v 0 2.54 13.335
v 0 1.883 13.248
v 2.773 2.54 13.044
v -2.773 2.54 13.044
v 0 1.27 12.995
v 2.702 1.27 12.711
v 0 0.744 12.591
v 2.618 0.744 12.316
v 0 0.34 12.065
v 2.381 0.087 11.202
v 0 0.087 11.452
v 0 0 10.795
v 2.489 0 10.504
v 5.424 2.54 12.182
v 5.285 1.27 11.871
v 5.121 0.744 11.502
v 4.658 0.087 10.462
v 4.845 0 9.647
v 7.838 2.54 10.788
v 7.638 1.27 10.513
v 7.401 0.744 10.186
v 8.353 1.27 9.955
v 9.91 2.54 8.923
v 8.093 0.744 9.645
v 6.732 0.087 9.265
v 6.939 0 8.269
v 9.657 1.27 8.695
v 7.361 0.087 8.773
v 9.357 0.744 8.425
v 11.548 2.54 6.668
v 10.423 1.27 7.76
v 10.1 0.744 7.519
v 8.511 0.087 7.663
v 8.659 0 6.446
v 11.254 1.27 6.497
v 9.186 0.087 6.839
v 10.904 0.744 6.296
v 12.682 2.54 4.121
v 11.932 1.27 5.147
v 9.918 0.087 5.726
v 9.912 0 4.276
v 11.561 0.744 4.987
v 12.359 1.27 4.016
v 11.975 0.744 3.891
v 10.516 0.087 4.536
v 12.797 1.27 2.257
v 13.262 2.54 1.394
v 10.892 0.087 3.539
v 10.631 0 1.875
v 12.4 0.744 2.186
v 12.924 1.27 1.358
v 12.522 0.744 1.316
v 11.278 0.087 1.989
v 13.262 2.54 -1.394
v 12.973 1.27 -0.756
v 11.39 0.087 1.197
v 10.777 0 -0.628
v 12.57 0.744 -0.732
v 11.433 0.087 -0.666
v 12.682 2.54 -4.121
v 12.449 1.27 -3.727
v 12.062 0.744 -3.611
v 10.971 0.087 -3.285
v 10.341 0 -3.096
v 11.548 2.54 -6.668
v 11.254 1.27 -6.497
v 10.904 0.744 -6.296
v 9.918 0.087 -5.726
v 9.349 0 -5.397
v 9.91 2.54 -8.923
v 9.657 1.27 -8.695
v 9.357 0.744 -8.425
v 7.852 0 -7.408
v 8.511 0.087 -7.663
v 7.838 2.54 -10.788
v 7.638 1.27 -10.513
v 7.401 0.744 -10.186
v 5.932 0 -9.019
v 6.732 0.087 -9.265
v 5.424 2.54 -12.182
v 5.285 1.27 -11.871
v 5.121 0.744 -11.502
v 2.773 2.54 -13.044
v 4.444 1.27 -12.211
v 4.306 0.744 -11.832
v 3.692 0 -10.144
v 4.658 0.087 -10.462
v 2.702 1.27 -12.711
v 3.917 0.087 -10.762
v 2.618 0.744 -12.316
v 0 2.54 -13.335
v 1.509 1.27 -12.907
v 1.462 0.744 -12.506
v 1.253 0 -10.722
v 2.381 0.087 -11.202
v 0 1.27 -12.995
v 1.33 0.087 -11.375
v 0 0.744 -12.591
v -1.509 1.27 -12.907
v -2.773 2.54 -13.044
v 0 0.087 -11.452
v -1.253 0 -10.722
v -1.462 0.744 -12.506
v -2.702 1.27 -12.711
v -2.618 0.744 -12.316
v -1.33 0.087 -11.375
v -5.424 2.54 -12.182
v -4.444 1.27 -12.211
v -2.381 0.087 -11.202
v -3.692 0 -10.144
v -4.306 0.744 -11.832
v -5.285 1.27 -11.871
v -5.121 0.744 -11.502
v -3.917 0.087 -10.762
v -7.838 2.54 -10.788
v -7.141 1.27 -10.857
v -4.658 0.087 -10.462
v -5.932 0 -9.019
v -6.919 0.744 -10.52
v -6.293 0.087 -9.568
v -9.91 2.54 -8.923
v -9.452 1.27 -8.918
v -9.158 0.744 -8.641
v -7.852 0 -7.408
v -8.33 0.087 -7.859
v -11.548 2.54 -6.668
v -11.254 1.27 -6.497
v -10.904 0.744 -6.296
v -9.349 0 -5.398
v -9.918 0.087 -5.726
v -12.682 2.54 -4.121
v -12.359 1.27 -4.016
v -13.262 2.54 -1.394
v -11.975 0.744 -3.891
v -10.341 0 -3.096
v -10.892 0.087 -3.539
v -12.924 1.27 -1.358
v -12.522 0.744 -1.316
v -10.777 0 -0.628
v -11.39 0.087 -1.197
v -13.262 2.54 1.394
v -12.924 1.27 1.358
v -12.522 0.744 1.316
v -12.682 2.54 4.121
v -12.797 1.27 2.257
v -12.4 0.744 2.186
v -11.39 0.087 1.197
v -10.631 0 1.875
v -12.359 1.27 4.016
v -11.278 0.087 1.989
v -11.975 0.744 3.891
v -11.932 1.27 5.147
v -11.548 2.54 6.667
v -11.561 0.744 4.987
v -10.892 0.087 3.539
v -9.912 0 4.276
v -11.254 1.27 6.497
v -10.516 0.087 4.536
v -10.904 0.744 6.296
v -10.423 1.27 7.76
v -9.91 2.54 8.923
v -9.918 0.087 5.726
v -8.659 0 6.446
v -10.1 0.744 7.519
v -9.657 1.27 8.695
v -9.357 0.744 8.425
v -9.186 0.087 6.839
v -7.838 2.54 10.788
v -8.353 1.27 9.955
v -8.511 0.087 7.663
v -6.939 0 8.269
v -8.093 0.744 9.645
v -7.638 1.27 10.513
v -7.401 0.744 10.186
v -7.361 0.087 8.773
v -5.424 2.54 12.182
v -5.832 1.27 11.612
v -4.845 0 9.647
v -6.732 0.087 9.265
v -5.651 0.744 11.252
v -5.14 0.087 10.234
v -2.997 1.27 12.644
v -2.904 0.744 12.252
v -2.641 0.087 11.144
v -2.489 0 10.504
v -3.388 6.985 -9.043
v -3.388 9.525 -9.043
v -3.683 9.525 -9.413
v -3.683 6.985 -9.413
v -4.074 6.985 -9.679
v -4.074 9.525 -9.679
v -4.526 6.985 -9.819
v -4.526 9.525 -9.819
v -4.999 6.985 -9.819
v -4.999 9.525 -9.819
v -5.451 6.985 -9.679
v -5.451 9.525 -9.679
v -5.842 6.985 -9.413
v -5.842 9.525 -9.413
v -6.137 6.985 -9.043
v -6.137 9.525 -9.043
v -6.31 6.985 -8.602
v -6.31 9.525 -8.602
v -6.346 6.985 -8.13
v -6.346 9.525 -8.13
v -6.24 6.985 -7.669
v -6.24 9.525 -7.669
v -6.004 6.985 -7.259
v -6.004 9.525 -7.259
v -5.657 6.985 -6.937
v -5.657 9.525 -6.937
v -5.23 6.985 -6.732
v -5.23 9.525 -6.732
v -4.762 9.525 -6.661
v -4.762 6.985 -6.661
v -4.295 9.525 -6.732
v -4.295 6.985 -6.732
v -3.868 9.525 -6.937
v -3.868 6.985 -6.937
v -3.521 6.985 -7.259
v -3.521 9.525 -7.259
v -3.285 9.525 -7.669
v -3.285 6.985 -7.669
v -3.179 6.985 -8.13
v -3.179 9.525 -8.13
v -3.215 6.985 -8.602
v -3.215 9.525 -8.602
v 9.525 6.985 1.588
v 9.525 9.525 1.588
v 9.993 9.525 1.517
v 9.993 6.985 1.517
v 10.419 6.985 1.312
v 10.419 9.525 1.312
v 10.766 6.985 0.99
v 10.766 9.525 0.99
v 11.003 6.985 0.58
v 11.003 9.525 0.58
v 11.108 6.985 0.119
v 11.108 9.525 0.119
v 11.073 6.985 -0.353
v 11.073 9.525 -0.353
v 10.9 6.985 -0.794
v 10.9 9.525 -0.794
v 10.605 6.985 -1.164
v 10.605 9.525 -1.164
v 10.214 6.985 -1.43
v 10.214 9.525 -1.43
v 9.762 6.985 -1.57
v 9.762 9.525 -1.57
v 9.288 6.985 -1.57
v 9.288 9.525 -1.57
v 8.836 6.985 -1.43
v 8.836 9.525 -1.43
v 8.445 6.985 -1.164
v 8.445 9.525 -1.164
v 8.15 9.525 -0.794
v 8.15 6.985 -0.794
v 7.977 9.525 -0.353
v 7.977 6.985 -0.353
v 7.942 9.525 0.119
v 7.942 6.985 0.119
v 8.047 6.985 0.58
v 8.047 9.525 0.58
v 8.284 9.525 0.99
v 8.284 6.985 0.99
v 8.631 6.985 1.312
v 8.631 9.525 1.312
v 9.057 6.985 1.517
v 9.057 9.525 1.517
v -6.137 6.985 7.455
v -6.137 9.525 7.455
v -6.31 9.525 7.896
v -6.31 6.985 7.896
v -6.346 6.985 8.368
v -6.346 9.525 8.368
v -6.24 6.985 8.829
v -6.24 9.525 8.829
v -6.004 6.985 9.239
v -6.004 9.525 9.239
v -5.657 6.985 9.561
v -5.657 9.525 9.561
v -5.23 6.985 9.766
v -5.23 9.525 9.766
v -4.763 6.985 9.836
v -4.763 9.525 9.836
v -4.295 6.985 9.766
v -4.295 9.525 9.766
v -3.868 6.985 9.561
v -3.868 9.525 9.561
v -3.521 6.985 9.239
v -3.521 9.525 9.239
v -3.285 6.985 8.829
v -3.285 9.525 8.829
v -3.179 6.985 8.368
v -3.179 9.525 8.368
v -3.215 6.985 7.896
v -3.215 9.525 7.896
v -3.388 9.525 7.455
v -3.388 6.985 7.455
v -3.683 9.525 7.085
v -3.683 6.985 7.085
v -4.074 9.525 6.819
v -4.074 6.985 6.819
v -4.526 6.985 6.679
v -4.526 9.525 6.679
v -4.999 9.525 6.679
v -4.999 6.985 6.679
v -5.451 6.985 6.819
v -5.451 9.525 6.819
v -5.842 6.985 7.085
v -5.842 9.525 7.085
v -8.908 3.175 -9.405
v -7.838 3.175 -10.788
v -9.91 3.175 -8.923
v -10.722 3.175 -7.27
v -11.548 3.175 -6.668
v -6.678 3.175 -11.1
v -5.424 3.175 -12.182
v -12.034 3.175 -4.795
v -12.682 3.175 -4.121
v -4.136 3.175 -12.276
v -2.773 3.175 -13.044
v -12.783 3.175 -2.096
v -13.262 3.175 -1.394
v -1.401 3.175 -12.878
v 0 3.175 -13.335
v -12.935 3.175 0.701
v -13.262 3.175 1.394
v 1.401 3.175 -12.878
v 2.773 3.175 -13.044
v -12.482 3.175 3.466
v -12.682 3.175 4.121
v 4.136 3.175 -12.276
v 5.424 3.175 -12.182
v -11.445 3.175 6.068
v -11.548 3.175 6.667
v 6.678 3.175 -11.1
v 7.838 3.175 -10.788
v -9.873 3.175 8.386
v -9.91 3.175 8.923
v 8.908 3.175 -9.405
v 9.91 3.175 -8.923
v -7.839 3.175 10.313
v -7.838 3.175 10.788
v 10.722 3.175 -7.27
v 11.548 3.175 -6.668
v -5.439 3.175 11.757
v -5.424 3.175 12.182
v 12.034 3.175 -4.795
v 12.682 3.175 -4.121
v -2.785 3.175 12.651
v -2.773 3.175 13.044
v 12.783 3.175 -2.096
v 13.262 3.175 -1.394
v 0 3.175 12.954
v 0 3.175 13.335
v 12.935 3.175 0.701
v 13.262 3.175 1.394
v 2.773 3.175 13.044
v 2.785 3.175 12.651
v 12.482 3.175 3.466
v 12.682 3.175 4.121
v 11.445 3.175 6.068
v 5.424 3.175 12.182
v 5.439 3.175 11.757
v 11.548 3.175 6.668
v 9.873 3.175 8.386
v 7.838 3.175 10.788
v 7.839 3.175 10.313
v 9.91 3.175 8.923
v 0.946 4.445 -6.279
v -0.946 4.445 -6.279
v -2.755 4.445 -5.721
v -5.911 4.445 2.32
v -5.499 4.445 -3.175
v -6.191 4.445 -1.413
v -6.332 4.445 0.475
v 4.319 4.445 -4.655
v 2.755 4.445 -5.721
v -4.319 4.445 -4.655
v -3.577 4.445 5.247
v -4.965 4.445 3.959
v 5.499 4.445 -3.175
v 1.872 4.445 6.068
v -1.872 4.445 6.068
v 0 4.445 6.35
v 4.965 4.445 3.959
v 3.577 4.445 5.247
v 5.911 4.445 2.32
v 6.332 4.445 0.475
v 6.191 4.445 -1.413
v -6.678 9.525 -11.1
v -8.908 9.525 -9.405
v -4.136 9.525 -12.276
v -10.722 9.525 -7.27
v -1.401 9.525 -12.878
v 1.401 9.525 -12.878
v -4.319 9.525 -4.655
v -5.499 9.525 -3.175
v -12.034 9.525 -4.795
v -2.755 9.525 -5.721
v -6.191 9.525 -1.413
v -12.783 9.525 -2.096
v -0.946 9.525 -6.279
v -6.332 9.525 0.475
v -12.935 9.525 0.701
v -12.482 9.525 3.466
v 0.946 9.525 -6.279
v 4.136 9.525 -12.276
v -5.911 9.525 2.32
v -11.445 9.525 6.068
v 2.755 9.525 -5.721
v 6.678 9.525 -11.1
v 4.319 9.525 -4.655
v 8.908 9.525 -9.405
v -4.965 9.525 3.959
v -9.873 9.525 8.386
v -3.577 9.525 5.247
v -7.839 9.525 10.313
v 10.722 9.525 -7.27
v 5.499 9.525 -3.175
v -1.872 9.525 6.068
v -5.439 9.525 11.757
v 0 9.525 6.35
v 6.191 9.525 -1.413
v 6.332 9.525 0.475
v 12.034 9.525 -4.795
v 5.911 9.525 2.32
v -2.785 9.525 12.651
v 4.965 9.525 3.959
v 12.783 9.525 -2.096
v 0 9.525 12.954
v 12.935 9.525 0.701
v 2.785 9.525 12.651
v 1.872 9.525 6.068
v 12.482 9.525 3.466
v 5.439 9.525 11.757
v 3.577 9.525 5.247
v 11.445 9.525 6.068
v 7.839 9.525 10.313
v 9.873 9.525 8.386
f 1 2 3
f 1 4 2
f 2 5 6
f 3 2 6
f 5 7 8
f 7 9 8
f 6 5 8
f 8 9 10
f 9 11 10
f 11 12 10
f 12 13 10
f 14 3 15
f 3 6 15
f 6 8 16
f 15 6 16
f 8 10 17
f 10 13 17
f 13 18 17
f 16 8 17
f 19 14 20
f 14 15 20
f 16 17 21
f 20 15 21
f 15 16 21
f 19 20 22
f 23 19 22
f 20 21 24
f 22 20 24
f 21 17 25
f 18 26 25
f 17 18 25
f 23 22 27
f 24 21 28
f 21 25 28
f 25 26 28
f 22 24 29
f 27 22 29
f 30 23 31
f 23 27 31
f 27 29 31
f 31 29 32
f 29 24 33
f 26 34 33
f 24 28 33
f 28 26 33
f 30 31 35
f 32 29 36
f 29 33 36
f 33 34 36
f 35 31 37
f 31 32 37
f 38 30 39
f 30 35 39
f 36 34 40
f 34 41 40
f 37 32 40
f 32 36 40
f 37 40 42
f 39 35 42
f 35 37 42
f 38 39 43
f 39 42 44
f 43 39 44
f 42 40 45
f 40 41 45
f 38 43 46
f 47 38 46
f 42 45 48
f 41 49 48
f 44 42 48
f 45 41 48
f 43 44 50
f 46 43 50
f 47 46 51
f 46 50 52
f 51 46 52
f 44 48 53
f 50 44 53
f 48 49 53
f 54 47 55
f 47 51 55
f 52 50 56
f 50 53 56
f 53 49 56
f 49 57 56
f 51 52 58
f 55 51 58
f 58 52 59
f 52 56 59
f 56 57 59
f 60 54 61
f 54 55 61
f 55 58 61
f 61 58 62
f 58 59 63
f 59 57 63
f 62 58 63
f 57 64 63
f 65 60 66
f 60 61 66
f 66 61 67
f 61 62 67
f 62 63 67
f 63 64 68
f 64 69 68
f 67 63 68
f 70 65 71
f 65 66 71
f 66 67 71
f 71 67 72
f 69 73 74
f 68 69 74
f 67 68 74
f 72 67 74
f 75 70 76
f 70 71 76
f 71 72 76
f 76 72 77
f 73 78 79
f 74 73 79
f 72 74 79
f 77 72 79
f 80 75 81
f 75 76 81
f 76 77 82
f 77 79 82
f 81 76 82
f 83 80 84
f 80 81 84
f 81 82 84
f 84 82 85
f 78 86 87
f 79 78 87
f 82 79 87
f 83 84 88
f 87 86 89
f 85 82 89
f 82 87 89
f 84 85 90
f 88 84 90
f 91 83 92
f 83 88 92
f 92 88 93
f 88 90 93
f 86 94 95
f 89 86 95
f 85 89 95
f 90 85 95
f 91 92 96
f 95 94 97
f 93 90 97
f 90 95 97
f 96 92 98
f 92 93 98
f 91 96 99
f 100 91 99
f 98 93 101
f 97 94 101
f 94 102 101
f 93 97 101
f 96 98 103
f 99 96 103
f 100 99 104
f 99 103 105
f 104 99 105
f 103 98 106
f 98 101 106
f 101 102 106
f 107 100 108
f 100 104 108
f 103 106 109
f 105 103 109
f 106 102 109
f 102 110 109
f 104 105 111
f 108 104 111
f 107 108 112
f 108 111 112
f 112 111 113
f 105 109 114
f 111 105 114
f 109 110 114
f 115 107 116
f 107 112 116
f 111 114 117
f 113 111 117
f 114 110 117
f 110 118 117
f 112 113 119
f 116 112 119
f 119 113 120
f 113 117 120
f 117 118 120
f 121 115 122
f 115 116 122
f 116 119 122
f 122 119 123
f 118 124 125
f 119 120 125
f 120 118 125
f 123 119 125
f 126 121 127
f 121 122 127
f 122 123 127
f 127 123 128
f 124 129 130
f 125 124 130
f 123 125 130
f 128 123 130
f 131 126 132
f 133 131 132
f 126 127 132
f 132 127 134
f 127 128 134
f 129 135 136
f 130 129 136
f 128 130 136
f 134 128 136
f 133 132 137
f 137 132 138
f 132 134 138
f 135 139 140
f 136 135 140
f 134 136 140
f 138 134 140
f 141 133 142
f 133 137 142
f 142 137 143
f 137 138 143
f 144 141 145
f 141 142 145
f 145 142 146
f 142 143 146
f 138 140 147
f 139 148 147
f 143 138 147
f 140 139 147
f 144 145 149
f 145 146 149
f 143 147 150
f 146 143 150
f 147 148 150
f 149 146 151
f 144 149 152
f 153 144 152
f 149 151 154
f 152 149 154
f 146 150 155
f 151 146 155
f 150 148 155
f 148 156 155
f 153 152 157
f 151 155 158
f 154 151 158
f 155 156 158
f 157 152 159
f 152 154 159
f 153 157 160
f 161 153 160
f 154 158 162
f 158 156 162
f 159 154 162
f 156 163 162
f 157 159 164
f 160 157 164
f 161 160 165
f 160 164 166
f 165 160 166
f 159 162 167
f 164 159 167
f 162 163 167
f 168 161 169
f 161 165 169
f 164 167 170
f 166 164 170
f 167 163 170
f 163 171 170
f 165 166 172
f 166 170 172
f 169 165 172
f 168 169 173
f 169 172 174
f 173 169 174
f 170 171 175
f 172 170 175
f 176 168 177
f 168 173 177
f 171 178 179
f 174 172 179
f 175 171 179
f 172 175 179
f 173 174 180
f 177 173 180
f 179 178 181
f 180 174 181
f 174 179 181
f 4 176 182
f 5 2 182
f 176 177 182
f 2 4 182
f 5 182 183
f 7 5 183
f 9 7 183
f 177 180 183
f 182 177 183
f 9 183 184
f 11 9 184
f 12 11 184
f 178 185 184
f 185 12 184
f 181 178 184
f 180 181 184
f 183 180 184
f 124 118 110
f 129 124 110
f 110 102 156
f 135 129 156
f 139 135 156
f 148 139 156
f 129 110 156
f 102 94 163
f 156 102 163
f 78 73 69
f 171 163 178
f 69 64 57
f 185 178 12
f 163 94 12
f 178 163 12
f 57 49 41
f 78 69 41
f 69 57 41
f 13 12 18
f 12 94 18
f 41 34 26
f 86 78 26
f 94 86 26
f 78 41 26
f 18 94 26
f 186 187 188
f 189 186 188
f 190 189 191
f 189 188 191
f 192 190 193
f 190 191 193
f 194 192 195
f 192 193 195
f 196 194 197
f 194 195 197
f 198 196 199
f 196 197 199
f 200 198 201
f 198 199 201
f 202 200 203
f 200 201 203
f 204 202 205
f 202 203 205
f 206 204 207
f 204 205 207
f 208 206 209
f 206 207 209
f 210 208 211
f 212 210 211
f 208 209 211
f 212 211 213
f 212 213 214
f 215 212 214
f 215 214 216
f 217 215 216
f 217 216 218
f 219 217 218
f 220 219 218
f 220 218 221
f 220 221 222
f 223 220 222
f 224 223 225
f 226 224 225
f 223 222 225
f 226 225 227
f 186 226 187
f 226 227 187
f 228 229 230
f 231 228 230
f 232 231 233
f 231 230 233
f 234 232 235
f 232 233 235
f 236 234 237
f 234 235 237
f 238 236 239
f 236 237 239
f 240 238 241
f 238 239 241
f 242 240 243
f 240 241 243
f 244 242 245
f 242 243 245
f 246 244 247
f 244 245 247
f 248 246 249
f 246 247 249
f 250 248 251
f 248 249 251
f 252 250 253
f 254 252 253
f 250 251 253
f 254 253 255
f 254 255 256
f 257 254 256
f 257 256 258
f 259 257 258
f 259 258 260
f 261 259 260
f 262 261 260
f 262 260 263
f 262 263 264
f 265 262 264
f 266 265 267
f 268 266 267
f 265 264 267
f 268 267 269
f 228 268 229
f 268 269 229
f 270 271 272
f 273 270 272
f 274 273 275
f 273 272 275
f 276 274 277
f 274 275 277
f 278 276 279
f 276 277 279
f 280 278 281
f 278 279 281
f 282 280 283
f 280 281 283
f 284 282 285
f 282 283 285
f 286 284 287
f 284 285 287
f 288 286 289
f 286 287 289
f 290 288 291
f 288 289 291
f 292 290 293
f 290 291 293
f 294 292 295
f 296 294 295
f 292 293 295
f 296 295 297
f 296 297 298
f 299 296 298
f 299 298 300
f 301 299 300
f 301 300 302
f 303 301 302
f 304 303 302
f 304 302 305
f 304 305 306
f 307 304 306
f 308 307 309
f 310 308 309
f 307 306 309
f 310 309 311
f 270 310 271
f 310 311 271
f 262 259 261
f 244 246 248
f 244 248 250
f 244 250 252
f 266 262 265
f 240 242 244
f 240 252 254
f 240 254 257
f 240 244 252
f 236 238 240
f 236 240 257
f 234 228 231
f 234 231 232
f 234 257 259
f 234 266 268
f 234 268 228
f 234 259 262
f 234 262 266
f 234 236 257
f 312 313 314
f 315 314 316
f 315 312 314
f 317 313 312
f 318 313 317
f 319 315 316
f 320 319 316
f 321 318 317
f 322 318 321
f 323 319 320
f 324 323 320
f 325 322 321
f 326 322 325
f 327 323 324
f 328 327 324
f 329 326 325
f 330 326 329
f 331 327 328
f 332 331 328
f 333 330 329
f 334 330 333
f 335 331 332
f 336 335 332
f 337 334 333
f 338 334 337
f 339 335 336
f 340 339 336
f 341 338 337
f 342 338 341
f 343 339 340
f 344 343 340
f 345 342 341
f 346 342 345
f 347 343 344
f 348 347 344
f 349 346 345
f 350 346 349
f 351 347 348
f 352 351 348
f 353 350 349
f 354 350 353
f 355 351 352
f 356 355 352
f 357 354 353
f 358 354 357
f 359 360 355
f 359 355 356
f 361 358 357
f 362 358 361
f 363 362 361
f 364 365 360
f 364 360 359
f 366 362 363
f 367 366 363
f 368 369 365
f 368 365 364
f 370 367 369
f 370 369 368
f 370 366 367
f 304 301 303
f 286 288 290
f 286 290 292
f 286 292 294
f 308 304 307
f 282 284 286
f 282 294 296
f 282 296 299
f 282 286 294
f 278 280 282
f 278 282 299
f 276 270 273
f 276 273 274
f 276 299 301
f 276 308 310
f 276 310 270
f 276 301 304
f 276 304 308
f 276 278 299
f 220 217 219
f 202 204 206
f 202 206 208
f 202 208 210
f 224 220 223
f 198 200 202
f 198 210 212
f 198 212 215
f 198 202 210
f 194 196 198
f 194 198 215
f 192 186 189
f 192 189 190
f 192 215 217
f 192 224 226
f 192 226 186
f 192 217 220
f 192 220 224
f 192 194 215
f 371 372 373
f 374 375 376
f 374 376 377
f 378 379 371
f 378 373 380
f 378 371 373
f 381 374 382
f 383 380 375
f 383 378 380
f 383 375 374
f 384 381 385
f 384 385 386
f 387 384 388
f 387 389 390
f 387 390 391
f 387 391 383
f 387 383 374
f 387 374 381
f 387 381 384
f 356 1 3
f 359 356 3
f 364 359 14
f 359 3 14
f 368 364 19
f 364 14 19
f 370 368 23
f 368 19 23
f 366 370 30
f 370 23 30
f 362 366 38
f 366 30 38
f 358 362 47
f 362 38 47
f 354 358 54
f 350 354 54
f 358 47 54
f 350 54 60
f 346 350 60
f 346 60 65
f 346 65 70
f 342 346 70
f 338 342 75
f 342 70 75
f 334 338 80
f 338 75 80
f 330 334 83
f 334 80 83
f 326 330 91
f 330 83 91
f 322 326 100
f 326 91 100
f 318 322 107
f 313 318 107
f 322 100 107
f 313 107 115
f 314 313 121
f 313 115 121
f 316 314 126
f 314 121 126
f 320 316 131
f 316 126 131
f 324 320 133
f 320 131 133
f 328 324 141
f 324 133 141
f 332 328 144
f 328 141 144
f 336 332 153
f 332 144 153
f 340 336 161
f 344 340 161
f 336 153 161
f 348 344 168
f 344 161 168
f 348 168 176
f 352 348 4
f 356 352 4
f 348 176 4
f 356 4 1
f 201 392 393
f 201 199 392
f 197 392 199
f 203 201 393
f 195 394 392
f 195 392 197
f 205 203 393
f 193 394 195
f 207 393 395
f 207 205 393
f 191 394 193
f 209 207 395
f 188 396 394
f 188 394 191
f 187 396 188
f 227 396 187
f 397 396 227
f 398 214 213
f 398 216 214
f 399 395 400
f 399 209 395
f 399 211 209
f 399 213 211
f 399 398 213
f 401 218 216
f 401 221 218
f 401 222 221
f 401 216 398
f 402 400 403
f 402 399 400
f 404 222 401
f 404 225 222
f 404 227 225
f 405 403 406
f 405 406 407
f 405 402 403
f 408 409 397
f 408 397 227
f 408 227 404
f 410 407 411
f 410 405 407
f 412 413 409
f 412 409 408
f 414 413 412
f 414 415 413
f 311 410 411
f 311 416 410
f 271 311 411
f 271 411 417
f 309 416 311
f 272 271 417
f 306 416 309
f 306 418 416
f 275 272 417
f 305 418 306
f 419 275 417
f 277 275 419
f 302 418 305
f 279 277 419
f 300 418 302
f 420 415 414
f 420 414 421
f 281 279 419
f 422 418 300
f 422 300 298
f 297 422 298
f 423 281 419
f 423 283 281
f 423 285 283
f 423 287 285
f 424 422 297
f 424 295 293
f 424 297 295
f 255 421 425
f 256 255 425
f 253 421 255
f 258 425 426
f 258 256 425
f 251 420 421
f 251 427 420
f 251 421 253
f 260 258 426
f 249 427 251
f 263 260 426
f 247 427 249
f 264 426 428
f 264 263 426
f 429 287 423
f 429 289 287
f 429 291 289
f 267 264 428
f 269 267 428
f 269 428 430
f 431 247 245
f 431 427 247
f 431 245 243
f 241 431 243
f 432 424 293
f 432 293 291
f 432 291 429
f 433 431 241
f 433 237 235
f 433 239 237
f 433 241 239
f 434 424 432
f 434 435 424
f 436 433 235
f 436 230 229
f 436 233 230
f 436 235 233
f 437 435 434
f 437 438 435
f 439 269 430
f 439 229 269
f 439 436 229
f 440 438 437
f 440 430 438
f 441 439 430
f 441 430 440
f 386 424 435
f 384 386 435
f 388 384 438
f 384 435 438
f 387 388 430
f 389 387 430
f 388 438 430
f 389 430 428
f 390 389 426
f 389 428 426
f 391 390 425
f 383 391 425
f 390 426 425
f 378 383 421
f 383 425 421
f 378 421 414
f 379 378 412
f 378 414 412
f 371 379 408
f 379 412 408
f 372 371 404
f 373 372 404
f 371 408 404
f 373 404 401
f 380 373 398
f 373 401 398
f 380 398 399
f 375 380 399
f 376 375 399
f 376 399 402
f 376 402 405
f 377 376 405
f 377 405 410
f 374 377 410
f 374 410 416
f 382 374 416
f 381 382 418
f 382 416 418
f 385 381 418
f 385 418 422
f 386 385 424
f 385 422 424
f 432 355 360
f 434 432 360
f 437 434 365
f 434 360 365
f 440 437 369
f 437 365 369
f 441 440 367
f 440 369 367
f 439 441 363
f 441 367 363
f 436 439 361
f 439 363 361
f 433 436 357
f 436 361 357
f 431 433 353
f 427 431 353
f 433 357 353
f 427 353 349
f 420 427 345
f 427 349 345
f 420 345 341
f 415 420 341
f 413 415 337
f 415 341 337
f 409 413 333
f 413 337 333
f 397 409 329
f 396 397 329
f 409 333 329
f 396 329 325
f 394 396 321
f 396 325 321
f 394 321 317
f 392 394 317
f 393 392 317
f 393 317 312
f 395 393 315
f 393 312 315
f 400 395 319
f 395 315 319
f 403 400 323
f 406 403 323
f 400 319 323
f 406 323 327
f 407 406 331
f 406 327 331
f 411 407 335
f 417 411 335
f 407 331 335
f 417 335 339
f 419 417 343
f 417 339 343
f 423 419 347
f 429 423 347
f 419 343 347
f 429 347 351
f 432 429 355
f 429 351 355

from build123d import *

# Parameters (mm, degrees)
SKETCH1_R           = 13.335
BOSS_EXTRUDE1_DEPTH = 3.175
SKETCH2_R           = 12.954
BOSS_EXTRUDE2_DEPTH = 6.35
SKETCH3_R           = 6.35
CUT_EXTRUDE2_DEPTH  = 5.08
SKETCH4_R           = 1.5875
CUT_EXTRUDE3_DEPTH  = 2.54
CIRPATTERN1_COUNT   = 3
FILLET1_R           = 2.54


with BuildPart() as part:
    # Sketch1 → Boss-Extrude1 (new body)
    with BuildSketch(Plane(origin=(0, 0, 0), x_dir=(1, 0, 0), z_dir=(0, 1, 0))):
        Circle(SKETCH1_R)
    extrude(amount=BOSS_EXTRUDE1_DEPTH)

    # Sketch2 → Boss-Extrude2 (add)
    with BuildSketch(Plane(origin=(0, 3.175, 0), x_dir=(1, 0, 0), z_dir=(0, 1, 0))):
        Circle(SKETCH2_R)
    extrude(amount=BOSS_EXTRUDE2_DEPTH)

    # Sketch3 → Cut-Extrude2 (cut)
    with BuildSketch(Plane(origin=(0, 9.525, 0), x_dir=(1, 0, 0), z_dir=(0, 1, 0))):
        Circle(SKETCH3_R)
    extrude(amount=-CUT_EXTRUDE2_DEPTH, mode=Mode.SUBTRACT)

    # Sketch4 → Cut-Extrude3 (cut)
    with BuildSketch(Plane(origin=(0, 9.525, 0), x_dir=(1, 0, 0), z_dir=(0, 1, 0))):
        with Locations((9.525, 0)):
            Circle(SKETCH4_R)
    cut_extrude3 = extrude(amount=-CUT_EXTRUDE3_DEPTH, mode=Mode.SUBTRACT)

    # CirPattern1: Cut-Extrude3 ×3 about axis
    cirpattern1_axis = Axis((0, 4.445, 0), (0, 1, 0))
    for i in range(1, CIRPATTERN1_COUNT):
        add(cut_extrude3.rotate(cirpattern1_axis, i * 360 / CIRPATTERN1_COUNT), mode=Mode.SUBTRACT)

    # Fillet1
    fillet1_edges = [part.edges().sort_by_distance(p)[0] for p in [
        (-13.335, 0, 0),
    ]]
    fillet(fillet1_edges, radius=FILLET1_R)


solid = part.part
